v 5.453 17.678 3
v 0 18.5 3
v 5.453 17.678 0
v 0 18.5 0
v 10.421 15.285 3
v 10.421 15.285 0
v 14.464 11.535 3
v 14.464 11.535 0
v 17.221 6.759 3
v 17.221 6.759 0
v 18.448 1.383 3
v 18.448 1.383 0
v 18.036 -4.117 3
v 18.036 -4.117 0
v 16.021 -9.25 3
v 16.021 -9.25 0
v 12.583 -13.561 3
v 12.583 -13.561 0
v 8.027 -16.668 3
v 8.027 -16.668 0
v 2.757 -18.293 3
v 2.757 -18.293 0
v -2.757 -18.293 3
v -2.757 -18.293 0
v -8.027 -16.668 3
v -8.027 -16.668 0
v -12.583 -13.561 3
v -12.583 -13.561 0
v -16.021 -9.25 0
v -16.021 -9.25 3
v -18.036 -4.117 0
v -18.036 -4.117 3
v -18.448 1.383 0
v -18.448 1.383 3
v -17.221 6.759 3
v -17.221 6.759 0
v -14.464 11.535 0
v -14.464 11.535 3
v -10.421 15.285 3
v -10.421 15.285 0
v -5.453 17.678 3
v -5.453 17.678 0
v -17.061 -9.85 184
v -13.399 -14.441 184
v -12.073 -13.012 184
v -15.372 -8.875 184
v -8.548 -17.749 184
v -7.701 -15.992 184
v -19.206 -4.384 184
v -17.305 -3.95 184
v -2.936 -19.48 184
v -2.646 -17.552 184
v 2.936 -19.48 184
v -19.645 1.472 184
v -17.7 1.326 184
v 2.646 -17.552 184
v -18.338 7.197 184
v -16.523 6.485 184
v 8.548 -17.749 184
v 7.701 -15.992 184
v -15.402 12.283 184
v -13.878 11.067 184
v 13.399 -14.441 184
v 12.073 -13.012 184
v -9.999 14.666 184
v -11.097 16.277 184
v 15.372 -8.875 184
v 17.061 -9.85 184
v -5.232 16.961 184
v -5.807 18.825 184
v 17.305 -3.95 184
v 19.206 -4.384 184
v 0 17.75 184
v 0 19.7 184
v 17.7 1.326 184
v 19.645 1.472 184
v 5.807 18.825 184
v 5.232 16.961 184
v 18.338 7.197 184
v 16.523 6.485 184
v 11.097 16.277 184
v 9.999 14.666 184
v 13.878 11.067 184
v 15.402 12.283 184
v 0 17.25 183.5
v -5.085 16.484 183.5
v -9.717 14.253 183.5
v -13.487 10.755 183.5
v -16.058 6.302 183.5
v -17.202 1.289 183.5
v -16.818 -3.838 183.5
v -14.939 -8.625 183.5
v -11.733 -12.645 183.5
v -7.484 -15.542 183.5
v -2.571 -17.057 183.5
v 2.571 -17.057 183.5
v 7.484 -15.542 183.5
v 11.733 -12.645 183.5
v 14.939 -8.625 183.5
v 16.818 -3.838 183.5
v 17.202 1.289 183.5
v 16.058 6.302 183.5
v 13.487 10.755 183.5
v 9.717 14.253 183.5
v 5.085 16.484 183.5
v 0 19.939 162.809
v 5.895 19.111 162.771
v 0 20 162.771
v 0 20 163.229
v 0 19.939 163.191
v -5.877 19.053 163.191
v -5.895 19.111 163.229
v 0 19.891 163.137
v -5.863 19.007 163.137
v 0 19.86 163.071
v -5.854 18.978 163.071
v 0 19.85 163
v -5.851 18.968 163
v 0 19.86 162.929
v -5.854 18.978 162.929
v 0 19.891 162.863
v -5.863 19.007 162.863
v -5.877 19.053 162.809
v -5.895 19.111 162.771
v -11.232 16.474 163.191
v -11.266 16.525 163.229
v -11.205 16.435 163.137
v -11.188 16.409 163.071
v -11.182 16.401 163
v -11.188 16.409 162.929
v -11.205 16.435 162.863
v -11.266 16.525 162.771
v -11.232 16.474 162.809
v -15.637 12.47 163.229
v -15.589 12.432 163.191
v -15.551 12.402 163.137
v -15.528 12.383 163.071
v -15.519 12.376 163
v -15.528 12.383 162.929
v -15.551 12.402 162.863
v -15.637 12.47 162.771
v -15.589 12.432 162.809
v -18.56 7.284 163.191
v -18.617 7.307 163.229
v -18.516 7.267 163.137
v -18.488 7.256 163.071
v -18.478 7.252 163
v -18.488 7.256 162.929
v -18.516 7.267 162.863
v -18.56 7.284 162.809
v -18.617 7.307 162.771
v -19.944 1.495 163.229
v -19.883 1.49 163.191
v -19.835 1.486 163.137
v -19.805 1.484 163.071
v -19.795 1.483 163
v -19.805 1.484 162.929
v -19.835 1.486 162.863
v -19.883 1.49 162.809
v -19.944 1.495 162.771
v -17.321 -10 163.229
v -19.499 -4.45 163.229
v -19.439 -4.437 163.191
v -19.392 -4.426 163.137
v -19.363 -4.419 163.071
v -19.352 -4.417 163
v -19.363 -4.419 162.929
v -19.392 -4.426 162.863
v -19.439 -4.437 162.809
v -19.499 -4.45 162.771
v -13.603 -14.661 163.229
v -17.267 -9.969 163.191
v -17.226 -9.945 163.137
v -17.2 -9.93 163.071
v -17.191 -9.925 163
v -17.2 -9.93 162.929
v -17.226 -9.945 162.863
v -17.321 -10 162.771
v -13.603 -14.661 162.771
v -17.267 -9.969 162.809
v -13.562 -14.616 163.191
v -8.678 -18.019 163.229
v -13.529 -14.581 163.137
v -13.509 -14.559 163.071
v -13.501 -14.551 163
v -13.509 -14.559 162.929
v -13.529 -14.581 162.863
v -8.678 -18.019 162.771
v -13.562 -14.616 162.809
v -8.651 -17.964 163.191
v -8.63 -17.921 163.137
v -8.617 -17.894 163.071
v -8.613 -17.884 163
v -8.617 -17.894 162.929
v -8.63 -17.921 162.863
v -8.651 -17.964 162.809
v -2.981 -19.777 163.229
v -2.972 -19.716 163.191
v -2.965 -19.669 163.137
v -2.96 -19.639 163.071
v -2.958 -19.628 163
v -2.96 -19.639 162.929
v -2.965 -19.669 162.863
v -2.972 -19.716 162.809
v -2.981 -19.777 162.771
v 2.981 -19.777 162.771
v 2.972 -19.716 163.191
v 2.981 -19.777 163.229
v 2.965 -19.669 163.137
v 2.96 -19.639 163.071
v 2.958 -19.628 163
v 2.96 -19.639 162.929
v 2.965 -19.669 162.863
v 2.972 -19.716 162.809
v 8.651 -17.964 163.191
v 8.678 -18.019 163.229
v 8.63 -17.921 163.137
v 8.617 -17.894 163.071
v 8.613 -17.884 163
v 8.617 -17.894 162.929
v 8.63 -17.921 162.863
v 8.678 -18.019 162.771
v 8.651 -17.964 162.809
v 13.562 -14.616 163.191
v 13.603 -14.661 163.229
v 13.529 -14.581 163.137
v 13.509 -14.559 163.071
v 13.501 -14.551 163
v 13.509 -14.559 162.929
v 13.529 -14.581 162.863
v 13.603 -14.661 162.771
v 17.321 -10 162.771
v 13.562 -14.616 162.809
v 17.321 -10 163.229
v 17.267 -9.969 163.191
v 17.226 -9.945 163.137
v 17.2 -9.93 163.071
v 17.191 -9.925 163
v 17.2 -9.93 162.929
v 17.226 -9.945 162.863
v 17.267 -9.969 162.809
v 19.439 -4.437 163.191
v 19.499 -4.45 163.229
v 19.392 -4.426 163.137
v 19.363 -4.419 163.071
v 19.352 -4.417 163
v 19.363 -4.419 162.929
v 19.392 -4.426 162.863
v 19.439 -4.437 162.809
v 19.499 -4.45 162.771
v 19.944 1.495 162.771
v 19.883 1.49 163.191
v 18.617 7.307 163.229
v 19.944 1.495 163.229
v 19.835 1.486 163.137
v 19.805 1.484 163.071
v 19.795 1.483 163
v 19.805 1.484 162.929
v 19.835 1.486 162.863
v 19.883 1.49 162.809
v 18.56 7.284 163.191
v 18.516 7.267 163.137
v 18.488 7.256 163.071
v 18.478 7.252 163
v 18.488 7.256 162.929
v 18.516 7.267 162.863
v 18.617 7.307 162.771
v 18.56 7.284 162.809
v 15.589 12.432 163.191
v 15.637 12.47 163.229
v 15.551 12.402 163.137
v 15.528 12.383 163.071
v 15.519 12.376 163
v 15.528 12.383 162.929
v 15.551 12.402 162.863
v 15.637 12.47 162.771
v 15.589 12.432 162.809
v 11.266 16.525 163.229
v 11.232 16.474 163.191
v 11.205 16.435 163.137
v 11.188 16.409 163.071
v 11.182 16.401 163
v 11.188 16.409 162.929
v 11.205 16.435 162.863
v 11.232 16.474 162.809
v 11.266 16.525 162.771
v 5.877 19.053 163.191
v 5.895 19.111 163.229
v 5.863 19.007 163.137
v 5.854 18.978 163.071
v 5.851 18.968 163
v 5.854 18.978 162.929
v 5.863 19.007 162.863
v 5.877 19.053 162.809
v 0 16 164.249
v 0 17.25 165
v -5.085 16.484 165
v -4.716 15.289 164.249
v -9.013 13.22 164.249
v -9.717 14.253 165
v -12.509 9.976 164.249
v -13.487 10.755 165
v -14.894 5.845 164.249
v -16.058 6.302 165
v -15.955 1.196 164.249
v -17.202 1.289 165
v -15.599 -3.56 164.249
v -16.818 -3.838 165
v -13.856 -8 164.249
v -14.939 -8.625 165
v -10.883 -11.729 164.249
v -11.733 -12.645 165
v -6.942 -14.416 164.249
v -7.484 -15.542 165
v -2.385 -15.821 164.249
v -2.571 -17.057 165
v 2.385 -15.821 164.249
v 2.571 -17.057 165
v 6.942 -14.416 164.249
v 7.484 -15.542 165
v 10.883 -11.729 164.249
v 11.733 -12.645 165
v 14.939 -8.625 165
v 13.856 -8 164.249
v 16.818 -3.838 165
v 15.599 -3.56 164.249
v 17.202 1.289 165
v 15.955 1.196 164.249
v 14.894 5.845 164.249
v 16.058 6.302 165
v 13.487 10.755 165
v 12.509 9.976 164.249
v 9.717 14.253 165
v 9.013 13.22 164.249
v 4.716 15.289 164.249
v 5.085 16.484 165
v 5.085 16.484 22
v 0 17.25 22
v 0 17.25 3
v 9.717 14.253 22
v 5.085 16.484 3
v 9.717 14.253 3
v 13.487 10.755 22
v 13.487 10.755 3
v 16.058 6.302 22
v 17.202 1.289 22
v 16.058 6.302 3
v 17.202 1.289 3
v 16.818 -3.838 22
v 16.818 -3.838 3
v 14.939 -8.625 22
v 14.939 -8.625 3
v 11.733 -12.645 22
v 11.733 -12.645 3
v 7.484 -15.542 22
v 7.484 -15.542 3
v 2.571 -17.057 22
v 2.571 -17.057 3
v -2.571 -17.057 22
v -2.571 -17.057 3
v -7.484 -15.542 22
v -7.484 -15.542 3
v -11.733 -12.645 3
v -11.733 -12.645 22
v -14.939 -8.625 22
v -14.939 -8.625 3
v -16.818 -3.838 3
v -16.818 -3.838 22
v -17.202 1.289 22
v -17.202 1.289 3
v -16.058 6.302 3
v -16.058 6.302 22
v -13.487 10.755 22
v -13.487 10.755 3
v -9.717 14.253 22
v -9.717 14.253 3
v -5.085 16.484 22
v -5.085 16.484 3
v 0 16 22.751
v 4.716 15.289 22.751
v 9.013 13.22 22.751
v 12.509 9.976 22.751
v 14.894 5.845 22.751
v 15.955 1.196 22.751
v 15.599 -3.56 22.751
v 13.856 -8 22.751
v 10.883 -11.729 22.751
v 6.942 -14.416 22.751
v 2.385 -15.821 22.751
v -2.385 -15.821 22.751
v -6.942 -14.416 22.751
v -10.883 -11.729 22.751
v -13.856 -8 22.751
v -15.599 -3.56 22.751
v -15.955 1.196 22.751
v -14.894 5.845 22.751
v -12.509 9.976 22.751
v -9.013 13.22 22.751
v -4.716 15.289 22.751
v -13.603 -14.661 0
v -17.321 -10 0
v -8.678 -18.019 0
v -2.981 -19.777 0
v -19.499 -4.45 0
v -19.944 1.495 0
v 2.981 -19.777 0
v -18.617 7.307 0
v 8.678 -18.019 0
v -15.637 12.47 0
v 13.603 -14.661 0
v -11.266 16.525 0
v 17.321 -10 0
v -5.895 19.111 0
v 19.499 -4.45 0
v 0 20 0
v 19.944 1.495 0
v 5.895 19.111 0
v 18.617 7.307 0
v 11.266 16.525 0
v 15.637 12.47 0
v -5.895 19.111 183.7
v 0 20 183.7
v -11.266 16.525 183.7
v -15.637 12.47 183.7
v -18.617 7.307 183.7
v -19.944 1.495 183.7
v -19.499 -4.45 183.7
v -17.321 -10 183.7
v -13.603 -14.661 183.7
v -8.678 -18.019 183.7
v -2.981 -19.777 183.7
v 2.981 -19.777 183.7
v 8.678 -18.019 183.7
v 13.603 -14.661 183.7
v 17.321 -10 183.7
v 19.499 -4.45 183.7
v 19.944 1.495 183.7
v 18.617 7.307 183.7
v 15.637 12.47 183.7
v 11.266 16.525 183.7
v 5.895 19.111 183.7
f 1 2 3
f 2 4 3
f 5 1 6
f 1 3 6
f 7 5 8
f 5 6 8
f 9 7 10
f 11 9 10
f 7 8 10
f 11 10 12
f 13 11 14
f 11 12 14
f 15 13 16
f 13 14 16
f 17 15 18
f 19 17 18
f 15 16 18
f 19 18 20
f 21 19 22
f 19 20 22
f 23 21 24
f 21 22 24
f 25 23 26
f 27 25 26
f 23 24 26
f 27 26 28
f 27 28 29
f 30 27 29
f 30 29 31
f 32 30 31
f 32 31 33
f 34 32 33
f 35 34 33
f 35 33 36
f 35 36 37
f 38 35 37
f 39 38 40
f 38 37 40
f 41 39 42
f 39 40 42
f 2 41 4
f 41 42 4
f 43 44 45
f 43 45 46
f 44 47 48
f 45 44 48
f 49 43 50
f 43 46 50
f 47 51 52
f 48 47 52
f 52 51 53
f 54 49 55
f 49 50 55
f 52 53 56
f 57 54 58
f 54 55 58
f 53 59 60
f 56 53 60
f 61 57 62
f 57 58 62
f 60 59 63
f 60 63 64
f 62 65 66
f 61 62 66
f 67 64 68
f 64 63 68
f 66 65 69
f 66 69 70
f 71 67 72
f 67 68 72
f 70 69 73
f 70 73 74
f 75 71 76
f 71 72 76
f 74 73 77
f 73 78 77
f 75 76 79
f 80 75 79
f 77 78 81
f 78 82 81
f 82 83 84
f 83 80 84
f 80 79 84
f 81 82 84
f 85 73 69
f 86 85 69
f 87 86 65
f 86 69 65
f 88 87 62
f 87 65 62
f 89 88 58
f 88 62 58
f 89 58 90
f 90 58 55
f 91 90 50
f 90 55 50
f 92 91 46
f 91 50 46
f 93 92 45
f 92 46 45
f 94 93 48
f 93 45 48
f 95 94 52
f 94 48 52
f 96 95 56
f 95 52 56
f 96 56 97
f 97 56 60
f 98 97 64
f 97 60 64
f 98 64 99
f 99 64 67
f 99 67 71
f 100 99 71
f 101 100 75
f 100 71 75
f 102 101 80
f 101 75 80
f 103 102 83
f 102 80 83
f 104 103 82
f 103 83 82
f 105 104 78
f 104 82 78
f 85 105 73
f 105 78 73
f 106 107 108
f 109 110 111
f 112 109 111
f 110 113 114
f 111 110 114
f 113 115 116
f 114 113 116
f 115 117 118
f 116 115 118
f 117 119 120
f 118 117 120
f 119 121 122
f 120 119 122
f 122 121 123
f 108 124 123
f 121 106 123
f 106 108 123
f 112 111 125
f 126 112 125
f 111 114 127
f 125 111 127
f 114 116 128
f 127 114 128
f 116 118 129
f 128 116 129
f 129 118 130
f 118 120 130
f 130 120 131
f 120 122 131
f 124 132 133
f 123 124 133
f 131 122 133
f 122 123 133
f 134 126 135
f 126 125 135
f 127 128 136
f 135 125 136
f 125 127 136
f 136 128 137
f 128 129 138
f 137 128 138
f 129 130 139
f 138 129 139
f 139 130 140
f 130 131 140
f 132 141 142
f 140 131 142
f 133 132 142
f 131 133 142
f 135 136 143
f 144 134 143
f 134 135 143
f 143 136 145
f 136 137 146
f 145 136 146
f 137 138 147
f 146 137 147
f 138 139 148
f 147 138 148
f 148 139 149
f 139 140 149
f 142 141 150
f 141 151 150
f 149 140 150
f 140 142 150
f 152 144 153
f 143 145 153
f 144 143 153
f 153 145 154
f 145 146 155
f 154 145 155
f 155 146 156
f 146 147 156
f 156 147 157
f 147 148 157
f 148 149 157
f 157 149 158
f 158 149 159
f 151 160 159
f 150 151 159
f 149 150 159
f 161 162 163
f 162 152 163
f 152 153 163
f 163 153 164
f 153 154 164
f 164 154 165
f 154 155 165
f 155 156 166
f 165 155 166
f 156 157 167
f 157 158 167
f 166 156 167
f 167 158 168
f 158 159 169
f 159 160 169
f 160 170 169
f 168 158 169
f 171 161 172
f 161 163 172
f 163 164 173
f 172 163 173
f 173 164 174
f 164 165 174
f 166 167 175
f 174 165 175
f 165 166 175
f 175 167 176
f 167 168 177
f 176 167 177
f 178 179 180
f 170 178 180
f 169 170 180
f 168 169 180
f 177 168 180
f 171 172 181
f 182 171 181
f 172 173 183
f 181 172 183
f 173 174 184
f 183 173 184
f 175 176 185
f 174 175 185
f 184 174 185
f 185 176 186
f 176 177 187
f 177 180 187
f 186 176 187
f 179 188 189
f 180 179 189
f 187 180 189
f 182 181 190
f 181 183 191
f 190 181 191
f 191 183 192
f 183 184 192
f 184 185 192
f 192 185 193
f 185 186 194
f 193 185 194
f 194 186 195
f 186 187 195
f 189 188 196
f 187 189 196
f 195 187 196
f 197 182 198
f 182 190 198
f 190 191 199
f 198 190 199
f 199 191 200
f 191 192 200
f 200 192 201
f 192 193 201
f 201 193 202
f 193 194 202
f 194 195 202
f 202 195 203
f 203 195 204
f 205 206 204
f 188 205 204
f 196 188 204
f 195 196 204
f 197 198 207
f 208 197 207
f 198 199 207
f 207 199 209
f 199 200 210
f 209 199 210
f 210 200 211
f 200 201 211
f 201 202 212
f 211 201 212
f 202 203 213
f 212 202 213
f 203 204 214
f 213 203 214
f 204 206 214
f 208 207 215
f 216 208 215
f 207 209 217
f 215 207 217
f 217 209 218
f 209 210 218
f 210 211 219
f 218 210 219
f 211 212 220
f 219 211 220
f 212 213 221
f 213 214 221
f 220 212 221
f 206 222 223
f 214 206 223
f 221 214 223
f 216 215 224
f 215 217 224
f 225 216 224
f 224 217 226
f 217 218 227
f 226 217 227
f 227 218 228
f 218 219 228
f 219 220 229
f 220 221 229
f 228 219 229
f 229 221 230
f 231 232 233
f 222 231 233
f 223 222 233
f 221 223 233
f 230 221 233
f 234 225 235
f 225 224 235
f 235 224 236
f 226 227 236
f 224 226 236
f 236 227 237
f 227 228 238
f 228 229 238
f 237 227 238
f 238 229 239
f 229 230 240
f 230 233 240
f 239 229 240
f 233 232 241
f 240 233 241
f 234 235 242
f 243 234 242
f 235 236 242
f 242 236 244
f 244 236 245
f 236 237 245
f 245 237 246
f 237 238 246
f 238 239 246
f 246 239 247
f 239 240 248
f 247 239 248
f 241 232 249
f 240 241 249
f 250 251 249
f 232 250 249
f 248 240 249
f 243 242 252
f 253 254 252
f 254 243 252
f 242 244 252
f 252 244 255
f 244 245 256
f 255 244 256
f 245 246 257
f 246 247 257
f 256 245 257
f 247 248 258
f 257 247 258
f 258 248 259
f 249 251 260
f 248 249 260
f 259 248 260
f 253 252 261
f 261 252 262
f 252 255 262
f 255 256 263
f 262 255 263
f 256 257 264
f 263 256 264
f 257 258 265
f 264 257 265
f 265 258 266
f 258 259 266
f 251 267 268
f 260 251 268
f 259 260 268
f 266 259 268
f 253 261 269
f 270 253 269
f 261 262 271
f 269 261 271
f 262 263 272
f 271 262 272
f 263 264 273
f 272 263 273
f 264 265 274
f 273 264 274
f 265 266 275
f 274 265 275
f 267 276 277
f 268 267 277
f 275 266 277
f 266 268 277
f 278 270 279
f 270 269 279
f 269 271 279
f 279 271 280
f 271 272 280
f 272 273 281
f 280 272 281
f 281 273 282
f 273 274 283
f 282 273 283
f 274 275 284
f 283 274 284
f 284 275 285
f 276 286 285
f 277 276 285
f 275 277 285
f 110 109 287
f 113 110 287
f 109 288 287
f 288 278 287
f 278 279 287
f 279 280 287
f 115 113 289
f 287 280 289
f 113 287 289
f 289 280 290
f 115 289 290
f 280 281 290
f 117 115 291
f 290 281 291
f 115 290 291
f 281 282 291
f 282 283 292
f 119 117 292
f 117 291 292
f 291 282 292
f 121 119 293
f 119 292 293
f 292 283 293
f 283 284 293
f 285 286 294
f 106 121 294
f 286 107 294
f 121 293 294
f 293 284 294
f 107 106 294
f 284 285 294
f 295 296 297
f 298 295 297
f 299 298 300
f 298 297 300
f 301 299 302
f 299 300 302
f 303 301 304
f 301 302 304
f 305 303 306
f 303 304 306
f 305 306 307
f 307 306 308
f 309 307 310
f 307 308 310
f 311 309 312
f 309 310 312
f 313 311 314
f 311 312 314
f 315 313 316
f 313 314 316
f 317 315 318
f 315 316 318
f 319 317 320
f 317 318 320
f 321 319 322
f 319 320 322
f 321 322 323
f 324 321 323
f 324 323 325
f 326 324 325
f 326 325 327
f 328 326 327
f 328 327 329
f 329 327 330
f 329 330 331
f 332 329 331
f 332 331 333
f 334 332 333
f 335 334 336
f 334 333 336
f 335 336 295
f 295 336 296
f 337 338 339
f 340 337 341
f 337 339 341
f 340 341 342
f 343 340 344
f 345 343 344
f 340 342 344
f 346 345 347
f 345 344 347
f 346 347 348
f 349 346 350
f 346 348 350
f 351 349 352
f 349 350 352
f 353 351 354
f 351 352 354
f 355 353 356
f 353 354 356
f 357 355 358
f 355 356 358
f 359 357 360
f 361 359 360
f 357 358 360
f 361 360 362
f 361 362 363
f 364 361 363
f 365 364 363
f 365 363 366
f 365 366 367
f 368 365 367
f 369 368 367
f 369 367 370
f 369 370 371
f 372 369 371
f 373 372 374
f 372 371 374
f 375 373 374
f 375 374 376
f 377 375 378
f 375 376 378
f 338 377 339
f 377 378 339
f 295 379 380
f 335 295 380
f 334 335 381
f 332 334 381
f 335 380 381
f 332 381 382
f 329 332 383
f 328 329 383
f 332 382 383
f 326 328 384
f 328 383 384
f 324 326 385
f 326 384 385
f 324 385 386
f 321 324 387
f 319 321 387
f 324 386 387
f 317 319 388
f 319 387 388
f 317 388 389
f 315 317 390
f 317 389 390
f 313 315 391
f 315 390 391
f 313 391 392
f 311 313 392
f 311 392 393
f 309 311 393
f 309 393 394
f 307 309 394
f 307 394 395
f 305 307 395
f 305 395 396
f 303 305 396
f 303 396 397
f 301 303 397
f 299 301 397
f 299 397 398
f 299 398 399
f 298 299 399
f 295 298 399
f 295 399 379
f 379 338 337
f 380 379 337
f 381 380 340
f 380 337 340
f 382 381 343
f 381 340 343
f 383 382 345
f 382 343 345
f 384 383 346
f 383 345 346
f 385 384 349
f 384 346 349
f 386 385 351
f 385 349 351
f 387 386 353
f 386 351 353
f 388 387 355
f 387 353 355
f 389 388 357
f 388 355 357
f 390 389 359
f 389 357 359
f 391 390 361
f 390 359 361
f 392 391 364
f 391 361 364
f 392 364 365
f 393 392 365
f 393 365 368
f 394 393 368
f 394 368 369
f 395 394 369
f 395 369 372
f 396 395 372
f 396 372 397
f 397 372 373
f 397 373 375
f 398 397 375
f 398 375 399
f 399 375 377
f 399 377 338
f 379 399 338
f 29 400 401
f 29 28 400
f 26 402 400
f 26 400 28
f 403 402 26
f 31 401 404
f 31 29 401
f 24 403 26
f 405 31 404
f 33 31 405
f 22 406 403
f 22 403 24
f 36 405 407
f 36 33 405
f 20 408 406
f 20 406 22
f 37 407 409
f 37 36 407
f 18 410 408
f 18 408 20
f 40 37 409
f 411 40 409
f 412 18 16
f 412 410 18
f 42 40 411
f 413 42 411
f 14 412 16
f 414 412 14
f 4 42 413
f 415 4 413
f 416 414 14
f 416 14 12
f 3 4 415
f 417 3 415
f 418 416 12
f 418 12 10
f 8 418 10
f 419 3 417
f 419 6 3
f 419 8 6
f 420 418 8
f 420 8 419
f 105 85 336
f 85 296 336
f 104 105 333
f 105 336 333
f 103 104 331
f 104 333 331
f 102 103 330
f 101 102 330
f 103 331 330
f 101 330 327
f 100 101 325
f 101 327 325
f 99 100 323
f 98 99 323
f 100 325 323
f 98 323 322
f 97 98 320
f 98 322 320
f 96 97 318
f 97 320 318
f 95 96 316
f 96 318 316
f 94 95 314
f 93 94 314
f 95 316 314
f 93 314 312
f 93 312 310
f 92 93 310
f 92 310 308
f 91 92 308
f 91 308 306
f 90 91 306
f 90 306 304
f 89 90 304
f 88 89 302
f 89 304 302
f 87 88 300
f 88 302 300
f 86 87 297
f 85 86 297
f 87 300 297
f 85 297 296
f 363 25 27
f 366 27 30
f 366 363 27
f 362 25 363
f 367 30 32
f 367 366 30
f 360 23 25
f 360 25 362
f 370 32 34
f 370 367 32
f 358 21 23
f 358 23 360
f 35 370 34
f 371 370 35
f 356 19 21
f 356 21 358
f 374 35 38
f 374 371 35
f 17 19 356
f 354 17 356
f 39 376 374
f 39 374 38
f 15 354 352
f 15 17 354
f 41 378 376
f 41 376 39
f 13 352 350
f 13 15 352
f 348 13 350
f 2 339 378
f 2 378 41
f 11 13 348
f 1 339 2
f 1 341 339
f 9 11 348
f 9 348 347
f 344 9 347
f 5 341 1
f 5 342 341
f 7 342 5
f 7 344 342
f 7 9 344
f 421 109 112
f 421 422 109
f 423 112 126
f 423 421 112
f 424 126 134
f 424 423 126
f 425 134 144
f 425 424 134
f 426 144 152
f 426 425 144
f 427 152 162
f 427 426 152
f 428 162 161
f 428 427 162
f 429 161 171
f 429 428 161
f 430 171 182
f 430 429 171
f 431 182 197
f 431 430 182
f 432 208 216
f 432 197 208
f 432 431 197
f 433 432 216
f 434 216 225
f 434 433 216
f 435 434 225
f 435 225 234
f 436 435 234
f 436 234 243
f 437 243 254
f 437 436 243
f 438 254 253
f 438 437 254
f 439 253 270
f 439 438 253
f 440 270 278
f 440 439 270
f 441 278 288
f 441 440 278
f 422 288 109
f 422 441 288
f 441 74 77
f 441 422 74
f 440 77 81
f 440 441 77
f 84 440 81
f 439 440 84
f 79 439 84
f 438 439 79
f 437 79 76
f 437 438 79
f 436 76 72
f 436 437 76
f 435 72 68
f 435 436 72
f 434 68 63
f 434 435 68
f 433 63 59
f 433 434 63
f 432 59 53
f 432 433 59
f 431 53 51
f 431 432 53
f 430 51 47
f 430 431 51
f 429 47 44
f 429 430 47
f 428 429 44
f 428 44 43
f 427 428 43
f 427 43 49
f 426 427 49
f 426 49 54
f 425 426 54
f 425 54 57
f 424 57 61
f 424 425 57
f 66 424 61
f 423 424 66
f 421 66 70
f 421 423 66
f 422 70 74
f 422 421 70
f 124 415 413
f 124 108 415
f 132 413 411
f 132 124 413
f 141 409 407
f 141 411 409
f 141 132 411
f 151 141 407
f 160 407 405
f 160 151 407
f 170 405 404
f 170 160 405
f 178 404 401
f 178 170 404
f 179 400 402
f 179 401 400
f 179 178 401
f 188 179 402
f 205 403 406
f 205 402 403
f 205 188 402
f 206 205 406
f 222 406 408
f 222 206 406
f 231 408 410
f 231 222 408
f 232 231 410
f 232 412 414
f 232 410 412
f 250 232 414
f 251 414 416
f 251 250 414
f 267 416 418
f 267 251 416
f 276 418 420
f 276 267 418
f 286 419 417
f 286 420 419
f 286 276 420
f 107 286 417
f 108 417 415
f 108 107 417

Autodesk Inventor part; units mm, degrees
sketch "Sketch_1" plane through (0, 0, 0) normal (1, 0, 0) x (0, 0, -1)
  line L0 (0, 0) -> (-184, 0)
  line L1 (-184, 19.7) -> (-184, 17.75)
  line L2 (-184, 17.75) -> (-183.5, 17.25)
  line L3 (-183.5, 17.25) -> (-165, 17.25)
  line L4 (-165, 17.25) -> (-164.2489, 16)
  line L5 (-164.2489, 16) -> (-22.7511, 16)
  line L6 (-22.7511, 16) -> (-22, 17.25)
  line L7 (-22, 17.25) -> (-3, 17.25)
  line L8 (-3, 17.25) -> (-3, 18.5)
  line L9 (-3, 18.5) -> (0, 18.5)
  line L10 (0, 18.5) -> (0, 20)
  line L11 (0, 20) -> (-162.7709, 20)
  arc A0 (-163.2291, 20) -> (-162.7709, 20) centre (-163, 20.1) ccw
  line L12 (-163.2291, 20) -> (-183.7, 20)
  line L13 (-183.7, 20) -> (-184, 19.7)
revolve "Revolution1" add sketch "Sketch_1" angle 360 about axis through (0, 0, 0) along (0, 0, -1)
ref_plane "ABDECKKAPPE_XY" through (0, 0, 158) normal (0, 0, 1) x (1, 0, 0)
ref_plane "ABDECKKAPPE_YZ" through (0, 0, 158) normal (1, 0, 0) x (0, 1, 0)
ref_plane "ABDECKKAPPE_ZX" through (0, 0, 158) normal (0, 1, 0) x (0, 0, 1)
ref_plane "SCHUBSTANGE_XY" through (0, 0, 184) normal (0, 0, -1) x (1, 0, 0)
ref_plane "SCHUBSTANGE_YZ" through (0, 0, 184) normal (1, 0, 0) x (0, -1, 0)
ref_plane "SCHUBSTANGE_ZX" through (0, 0, 184) normal (0, -1, 0) x (0, 0, -1)
properties part number "SLZ_63_Schubstange#_274.5_1001"
